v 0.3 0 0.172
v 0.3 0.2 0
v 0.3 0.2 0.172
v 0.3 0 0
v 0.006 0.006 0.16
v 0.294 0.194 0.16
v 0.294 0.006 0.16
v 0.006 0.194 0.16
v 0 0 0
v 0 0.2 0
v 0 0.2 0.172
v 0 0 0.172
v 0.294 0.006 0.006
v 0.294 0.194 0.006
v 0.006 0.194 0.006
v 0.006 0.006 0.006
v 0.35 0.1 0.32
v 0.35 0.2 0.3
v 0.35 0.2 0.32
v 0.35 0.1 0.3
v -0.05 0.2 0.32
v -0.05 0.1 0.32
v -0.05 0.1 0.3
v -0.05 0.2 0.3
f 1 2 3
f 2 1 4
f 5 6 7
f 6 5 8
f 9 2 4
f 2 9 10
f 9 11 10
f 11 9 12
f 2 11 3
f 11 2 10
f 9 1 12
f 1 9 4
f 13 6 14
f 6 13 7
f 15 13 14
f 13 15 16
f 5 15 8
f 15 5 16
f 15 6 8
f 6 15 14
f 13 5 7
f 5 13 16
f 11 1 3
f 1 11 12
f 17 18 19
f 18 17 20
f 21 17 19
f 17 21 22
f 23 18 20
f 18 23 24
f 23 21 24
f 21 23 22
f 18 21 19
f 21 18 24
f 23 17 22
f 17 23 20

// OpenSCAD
// A hinged box that describes its own mechanism.
//
// Simulated with:
//   cargo run -p threers-physics --features assembly,openscad \
//       --example scad_mechanism
//
// The four modules below are shims. threers overrides them with the real
// thing when it reads this file as a mechanism; OpenSCAD, which has never
// heard of them, uses these instead and renders the model as an ordinary
// static assembly. Without them OpenSCAD would drop every part() *along with
// its children* and show nothing at all.
module part(name, fixed = false, density = undef) { children(); }
module hinge(name, parts, at, axis, range) { }
module drive(name, to, over, at, torque) { }

// ---- dimensions (metres) ---------------------------------------------------
W    = 0.30;   // across the hinge
D    = 0.20;   // front to back
H    = 0.16;   // box height
T    = 0.012;  // lid thickness
OPEN = 105;    // degrees the lid is specified to open

// A shelf hangs over the box. It is scenery, but it is *declared* scenery —
// wrapped in a fixed part() so the mechanism knows it is there and the lid can
// hit it.
// The lid's far edge swings on a D radius from a hinge at z = H, so a shelf
// this high catches it around 45° — well short of the 105° asked for.
SHELF_Z = 0.30;

// ---- the model -------------------------------------------------------------
part("box", fixed = true)
    color("burlywood")
    difference() {
        cube([W, D, H]);
        translate([0.006, 0.006, 0.006]) cube([W - 0.012, D - 0.012, H]);
    }

part("lid", density = 1200)
    color("sienna")
    translate([0, 0, H]) cube([W, D, T]);

// A beam rather than a full slab, so it catches the lid without hiding it.
part("shelf", fixed = true)
    color("slategray")
    translate([-0.05, 0.10, SHELF_Z]) cube([W + 0.10, 0.10, 0.02]);

// The pivot is written once, in the coordinates the model is drawn in. Both
// parts share it, because both parts are drawn in the same space.
hinge("lid_pivot",
      parts = ["lid", "box"],
      at    = [W / 2, 0, H],
      axis  = [1, 0, 0],
      range = [0, OPEN]);

// Not a pose — a request. The lid opens as far as it can, which is not as far
// as this asks: the shelf is in the way.
drive("lid_pivot", to = OPEN, over = 1.5);
